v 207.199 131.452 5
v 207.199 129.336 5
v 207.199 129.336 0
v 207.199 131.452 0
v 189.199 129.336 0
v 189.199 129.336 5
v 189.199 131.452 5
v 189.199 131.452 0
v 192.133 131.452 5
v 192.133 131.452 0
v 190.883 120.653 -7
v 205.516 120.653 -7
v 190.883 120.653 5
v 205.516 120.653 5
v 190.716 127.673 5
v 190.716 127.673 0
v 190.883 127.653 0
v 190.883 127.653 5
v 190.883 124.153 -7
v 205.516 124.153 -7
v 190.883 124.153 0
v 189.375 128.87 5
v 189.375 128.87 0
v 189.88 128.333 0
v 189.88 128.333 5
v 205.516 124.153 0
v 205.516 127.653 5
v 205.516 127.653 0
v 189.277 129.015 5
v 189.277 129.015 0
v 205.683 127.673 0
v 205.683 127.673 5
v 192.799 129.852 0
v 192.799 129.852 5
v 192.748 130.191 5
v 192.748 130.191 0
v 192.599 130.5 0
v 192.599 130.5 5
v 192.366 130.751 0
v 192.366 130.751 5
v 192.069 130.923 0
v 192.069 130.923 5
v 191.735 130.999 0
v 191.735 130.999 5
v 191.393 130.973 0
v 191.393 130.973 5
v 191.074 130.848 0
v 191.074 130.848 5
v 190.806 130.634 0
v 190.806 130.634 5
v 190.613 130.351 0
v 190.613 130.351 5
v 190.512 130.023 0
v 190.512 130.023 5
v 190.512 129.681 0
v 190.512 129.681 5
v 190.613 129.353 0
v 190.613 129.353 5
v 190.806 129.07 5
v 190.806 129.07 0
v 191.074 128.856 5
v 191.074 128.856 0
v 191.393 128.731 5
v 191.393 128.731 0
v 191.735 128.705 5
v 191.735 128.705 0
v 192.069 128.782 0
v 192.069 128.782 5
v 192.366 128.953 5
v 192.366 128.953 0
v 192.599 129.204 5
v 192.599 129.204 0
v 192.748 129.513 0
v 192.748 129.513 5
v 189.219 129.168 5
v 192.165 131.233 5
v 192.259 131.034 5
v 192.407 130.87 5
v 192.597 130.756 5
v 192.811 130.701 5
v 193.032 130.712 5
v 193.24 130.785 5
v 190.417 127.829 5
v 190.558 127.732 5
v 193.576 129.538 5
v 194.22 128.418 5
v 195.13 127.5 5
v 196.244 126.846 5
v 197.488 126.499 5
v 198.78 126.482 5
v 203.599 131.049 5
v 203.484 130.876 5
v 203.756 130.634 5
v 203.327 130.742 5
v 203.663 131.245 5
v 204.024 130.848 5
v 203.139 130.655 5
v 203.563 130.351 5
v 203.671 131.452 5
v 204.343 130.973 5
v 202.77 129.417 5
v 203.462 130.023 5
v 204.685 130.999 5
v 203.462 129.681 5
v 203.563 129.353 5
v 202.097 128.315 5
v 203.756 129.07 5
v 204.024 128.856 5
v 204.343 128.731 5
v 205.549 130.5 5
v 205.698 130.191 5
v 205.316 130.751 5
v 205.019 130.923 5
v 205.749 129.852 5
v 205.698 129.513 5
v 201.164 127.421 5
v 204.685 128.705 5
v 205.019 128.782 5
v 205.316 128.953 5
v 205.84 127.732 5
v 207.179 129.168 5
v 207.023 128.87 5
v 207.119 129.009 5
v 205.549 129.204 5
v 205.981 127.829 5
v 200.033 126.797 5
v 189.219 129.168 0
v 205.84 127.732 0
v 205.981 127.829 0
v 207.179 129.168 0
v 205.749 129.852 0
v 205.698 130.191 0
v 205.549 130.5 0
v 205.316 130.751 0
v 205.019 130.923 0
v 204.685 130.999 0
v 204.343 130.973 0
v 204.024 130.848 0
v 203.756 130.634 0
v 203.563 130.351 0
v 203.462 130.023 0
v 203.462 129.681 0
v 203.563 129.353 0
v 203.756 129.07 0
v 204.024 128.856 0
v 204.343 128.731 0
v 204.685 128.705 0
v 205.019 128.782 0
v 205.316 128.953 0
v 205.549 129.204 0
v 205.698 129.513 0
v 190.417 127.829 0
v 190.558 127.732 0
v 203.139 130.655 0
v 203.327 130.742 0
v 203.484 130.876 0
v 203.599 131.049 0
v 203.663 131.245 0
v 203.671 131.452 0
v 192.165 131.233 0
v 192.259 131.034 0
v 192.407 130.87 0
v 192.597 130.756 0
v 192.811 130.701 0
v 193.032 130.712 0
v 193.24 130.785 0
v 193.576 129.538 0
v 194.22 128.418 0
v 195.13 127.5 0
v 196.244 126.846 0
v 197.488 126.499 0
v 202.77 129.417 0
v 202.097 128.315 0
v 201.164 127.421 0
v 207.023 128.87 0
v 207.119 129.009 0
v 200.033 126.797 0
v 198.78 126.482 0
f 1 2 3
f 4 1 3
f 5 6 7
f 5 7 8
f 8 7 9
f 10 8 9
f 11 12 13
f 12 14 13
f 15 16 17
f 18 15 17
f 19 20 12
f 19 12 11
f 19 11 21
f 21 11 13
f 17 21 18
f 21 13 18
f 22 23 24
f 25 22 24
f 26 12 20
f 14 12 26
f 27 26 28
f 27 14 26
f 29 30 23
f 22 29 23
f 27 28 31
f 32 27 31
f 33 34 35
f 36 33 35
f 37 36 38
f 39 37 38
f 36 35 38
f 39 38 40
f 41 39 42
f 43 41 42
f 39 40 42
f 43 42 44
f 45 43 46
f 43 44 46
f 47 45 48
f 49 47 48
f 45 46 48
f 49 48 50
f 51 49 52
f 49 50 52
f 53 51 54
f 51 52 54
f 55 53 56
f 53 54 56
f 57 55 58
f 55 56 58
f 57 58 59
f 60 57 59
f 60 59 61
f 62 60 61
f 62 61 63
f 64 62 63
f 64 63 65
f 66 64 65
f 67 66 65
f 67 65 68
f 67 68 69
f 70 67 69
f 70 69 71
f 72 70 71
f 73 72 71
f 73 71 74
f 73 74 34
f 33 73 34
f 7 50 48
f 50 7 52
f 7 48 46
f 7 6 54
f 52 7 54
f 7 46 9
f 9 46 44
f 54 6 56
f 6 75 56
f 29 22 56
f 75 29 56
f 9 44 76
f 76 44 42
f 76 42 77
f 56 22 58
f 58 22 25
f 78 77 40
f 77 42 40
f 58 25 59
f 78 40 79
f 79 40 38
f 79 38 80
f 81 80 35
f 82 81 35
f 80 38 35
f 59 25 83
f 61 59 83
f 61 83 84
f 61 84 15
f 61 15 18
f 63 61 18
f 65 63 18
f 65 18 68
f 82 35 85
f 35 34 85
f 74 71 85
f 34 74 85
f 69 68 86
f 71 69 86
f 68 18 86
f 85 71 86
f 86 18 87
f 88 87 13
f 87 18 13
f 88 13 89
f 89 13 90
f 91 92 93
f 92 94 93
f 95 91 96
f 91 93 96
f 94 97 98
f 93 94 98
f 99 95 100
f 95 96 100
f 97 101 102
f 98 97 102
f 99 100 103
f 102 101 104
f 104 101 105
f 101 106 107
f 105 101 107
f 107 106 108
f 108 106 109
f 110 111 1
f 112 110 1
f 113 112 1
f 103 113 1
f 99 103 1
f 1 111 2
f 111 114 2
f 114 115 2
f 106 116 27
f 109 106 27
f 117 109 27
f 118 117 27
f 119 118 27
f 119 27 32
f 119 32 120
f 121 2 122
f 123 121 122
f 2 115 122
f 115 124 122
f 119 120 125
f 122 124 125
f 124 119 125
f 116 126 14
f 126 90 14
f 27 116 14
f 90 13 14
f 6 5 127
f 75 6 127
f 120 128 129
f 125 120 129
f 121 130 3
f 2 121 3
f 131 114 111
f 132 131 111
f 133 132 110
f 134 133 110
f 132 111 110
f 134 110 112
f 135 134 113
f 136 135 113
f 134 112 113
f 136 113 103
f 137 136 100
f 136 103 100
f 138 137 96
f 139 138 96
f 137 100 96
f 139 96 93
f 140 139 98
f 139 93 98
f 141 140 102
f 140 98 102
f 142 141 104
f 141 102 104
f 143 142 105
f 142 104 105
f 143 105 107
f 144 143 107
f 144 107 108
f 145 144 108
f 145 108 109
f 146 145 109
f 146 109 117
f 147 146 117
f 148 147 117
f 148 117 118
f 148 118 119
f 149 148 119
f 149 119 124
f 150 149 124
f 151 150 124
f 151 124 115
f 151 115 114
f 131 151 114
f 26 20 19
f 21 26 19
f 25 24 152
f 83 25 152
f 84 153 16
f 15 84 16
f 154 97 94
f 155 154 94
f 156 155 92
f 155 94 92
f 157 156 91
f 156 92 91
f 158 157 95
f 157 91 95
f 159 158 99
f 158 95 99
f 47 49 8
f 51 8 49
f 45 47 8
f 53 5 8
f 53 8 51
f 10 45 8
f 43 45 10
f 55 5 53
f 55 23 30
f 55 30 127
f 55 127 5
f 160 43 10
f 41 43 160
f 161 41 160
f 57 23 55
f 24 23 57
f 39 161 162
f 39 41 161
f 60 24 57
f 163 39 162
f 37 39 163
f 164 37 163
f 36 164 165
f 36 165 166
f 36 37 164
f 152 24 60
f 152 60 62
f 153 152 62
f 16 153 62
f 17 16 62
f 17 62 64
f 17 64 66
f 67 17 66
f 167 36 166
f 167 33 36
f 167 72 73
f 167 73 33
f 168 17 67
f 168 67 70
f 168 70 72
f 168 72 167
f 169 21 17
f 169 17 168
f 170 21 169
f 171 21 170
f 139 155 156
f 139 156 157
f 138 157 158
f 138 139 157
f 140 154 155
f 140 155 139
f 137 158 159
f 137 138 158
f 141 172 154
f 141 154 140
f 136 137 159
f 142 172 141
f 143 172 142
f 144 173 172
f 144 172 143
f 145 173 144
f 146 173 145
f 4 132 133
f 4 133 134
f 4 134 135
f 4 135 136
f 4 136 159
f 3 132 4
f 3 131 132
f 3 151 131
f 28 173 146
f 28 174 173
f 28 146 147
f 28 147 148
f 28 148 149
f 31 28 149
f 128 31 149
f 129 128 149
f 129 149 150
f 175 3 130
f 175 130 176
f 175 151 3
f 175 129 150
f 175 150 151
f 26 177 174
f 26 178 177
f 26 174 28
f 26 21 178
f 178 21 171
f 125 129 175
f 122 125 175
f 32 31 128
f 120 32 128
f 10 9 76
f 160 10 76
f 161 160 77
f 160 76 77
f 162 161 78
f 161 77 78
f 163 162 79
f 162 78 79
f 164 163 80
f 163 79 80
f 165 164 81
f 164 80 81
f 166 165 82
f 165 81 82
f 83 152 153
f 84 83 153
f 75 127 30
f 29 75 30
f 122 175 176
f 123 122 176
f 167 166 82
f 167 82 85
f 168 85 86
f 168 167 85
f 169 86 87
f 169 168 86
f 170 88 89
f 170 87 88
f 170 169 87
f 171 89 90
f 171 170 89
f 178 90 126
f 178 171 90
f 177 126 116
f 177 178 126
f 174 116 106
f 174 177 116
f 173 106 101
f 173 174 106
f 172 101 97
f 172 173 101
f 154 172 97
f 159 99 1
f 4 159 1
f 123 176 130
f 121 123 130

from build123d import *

# Parameters (mm, degrees)
FACE_2_DEPTH           = 5
SKETCH2_W              = 14.632926246
SKETCH2_H              = 5
BOSS_EXTRUDE2_DEPTH    = 7
SKETCH3_W              = 14.632926246
SKETCH3_H              = 7
BOSS_EXTRUDE3_DEPTH    = 7
EYE_HOLES_REACH        = 248.075
SKETCH4_R              = 1.15
SKETCH5_W              = 14.632926246
SKETCH5_H              = 3.5
SEAT_DEPTH             = 7
SKETCH6_W              = 18
SKETCH6_H              = 5
BOSS_EXTRUDE4_DEPTH    = 3.5
SKETCH7_W              = 18.025006546
SKETCH7_H              = 4.25
TOP_HOLE_DEPTH         = 248.972829901
MIDDLE_HOLE_DEPTH      = 246.672789516
MIDDLE_HOLE_DEPTH_BACK = 246.672789516
SKETCH8_R              = 5.003684601
SKETCH11_R             = 0.754398486
CUT_EXTRUDE9_DEPTH     = 246.672789516


with BuildPart() as part:
    # Sketch1 → Face 2 (new body)
    with BuildSketch(Plane.XY):
        Polygon((189.199131389, 129.336090234), (189.219408928, 129.168352428), (189.276625012, 129.01501095), (189.375109043, 128.870497126), (189.879763338, 128.333185306), (190.417075159, 127.828531011), (190.558185088, 127.731803407), (190.715733881, 127.672634267), (190.882668266, 127.652553357), (205.515594512, 127.652553357), (205.683332318, 127.672830896), (205.84007769, 127.731803407), (205.98118762, 127.828531011), (207.023153735, 128.870497126), (207.118523911, 129.009007135), (207.17885385, 129.168352428), (207.199131389, 129.336090234), (207.199131389, 132.202042434), (189.199131389, 132.202042434), align=None)
    extrude(amount=FACE_2_DEPTH)

    # Sketch2 → Boss-Extrude2 (add)
    with BuildSketch(Plane.XZ.offset(-127.652553357)):
        with Locations((198.199131389, 2.5)):
            Rectangle(SKETCH2_W, SKETCH2_H)
    extrude(amount=BOSS_EXTRUDE2_DEPTH)

    # Sketch3 → Boss-Extrude3 (add)
    with BuildSketch(Plane(origin=(0, 0, 0), x_dir=(-1, 0, 0), z_dir=(0, 0, -1))):
        with Locations((-198.199131389, 124.152553357)):
            Rectangle(SKETCH3_W, SKETCH3_H)
    extrude(amount=BOSS_EXTRUDE3_DEPTH)

    # Sketch4 → Eye Holes (cut, up to next)
    with BuildSketch(Plane.XY.offset(5), mode=Mode.PRIVATE) as eye_holes_sk1:
        with Locations((191.649131389, 129.852042434)):
            Circle(SKETCH4_R)
    eye_holes_tool1 = extrude(eye_holes_sk1.sketch, amount=-EYE_HOLES_REACH, mode=Mode.PRIVATE) & part.part
    # Sketch4 → Eye Holes (cut, up to next)
    with BuildSketch(Plane.XY.offset(5), mode=Mode.PRIVATE) as eye_holes_sk2:
        with Locations((204.599131389, 129.852042434)):
            Circle(SKETCH4_R)
    eye_holes_tool2 = extrude(eye_holes_sk2.sketch, amount=-EYE_HOLES_REACH, mode=Mode.PRIVATE) & part.part
    add(eye_holes_tool1.solids().sort_by_distance((191.649131, 129.852042, 5))[0], mode=Mode.SUBTRACT)
    add(eye_holes_tool2.solids().sort_by_distance((204.599131, 129.852042, 5))[0], mode=Mode.SUBTRACT)

    # Sketch5 → Seat (cut)
    with BuildSketch(Plane(origin=(0, 0, -7), x_dir=(-1, 0, 0), z_dir=(0, 0, -1))):
        with Locations((-198.199131389, 125.902553357)):
            Rectangle(SKETCH5_W, SKETCH5_H)
    extrude(amount=-SEAT_DEPTH, mode=Mode.SUBTRACT)

    # Sketch6 → Boss-Extrude4 (add)
    with BuildSketch(Plane(origin=(0, 132.202042434, 0), x_dir=(1, 0, 0), z_dir=(0, 1, 0))):
        with Locations((198.199131389, -2.5)):
            Rectangle(SKETCH6_W, SKETCH6_H)
    extrude(amount=BOSS_EXTRUDE4_DEPTH)

    # Sketch7 → Top Hole (cut, through all)
    with BuildSketch(Plane.XY.offset(5)):
        with Locations((198.194207579, 133.577042434)):
            Rectangle(SKETCH7_W, SKETCH7_H)
    extrude(amount=-TOP_HOLE_DEPTH, mode=Mode.SUBTRACT)

    # Sketch8 → Middle Hole (cut, two sides: drawn at the far end of the back side and taken through both)
    with BuildSketch(Plane.XY.offset(5).offset(-MIDDLE_HOLE_DEPTH_BACK)):
        with Locations((198.199131389, 131.452042434)):
            Circle(SKETCH8_R)
    extrude(amount=MIDDLE_HOLE_DEPTH + MIDDLE_HOLE_DEPTH_BACK, mode=Mode.SUBTRACT)

    # Sketch11 → Cut-Extrude9 (cut, through all)
    with BuildSketch(Plane.XY.offset(5)):
        with Locations((192.88691871, 131.452042434)):
            Circle(SKETCH11_R)
        with Locations((202.919958348, 131.377258625)):
            Circle(SKETCH11_R)
    extrude(amount=-CUT_EXTRUDE9_DEPTH, mode=Mode.SUBTRACT)


solid = part.part
